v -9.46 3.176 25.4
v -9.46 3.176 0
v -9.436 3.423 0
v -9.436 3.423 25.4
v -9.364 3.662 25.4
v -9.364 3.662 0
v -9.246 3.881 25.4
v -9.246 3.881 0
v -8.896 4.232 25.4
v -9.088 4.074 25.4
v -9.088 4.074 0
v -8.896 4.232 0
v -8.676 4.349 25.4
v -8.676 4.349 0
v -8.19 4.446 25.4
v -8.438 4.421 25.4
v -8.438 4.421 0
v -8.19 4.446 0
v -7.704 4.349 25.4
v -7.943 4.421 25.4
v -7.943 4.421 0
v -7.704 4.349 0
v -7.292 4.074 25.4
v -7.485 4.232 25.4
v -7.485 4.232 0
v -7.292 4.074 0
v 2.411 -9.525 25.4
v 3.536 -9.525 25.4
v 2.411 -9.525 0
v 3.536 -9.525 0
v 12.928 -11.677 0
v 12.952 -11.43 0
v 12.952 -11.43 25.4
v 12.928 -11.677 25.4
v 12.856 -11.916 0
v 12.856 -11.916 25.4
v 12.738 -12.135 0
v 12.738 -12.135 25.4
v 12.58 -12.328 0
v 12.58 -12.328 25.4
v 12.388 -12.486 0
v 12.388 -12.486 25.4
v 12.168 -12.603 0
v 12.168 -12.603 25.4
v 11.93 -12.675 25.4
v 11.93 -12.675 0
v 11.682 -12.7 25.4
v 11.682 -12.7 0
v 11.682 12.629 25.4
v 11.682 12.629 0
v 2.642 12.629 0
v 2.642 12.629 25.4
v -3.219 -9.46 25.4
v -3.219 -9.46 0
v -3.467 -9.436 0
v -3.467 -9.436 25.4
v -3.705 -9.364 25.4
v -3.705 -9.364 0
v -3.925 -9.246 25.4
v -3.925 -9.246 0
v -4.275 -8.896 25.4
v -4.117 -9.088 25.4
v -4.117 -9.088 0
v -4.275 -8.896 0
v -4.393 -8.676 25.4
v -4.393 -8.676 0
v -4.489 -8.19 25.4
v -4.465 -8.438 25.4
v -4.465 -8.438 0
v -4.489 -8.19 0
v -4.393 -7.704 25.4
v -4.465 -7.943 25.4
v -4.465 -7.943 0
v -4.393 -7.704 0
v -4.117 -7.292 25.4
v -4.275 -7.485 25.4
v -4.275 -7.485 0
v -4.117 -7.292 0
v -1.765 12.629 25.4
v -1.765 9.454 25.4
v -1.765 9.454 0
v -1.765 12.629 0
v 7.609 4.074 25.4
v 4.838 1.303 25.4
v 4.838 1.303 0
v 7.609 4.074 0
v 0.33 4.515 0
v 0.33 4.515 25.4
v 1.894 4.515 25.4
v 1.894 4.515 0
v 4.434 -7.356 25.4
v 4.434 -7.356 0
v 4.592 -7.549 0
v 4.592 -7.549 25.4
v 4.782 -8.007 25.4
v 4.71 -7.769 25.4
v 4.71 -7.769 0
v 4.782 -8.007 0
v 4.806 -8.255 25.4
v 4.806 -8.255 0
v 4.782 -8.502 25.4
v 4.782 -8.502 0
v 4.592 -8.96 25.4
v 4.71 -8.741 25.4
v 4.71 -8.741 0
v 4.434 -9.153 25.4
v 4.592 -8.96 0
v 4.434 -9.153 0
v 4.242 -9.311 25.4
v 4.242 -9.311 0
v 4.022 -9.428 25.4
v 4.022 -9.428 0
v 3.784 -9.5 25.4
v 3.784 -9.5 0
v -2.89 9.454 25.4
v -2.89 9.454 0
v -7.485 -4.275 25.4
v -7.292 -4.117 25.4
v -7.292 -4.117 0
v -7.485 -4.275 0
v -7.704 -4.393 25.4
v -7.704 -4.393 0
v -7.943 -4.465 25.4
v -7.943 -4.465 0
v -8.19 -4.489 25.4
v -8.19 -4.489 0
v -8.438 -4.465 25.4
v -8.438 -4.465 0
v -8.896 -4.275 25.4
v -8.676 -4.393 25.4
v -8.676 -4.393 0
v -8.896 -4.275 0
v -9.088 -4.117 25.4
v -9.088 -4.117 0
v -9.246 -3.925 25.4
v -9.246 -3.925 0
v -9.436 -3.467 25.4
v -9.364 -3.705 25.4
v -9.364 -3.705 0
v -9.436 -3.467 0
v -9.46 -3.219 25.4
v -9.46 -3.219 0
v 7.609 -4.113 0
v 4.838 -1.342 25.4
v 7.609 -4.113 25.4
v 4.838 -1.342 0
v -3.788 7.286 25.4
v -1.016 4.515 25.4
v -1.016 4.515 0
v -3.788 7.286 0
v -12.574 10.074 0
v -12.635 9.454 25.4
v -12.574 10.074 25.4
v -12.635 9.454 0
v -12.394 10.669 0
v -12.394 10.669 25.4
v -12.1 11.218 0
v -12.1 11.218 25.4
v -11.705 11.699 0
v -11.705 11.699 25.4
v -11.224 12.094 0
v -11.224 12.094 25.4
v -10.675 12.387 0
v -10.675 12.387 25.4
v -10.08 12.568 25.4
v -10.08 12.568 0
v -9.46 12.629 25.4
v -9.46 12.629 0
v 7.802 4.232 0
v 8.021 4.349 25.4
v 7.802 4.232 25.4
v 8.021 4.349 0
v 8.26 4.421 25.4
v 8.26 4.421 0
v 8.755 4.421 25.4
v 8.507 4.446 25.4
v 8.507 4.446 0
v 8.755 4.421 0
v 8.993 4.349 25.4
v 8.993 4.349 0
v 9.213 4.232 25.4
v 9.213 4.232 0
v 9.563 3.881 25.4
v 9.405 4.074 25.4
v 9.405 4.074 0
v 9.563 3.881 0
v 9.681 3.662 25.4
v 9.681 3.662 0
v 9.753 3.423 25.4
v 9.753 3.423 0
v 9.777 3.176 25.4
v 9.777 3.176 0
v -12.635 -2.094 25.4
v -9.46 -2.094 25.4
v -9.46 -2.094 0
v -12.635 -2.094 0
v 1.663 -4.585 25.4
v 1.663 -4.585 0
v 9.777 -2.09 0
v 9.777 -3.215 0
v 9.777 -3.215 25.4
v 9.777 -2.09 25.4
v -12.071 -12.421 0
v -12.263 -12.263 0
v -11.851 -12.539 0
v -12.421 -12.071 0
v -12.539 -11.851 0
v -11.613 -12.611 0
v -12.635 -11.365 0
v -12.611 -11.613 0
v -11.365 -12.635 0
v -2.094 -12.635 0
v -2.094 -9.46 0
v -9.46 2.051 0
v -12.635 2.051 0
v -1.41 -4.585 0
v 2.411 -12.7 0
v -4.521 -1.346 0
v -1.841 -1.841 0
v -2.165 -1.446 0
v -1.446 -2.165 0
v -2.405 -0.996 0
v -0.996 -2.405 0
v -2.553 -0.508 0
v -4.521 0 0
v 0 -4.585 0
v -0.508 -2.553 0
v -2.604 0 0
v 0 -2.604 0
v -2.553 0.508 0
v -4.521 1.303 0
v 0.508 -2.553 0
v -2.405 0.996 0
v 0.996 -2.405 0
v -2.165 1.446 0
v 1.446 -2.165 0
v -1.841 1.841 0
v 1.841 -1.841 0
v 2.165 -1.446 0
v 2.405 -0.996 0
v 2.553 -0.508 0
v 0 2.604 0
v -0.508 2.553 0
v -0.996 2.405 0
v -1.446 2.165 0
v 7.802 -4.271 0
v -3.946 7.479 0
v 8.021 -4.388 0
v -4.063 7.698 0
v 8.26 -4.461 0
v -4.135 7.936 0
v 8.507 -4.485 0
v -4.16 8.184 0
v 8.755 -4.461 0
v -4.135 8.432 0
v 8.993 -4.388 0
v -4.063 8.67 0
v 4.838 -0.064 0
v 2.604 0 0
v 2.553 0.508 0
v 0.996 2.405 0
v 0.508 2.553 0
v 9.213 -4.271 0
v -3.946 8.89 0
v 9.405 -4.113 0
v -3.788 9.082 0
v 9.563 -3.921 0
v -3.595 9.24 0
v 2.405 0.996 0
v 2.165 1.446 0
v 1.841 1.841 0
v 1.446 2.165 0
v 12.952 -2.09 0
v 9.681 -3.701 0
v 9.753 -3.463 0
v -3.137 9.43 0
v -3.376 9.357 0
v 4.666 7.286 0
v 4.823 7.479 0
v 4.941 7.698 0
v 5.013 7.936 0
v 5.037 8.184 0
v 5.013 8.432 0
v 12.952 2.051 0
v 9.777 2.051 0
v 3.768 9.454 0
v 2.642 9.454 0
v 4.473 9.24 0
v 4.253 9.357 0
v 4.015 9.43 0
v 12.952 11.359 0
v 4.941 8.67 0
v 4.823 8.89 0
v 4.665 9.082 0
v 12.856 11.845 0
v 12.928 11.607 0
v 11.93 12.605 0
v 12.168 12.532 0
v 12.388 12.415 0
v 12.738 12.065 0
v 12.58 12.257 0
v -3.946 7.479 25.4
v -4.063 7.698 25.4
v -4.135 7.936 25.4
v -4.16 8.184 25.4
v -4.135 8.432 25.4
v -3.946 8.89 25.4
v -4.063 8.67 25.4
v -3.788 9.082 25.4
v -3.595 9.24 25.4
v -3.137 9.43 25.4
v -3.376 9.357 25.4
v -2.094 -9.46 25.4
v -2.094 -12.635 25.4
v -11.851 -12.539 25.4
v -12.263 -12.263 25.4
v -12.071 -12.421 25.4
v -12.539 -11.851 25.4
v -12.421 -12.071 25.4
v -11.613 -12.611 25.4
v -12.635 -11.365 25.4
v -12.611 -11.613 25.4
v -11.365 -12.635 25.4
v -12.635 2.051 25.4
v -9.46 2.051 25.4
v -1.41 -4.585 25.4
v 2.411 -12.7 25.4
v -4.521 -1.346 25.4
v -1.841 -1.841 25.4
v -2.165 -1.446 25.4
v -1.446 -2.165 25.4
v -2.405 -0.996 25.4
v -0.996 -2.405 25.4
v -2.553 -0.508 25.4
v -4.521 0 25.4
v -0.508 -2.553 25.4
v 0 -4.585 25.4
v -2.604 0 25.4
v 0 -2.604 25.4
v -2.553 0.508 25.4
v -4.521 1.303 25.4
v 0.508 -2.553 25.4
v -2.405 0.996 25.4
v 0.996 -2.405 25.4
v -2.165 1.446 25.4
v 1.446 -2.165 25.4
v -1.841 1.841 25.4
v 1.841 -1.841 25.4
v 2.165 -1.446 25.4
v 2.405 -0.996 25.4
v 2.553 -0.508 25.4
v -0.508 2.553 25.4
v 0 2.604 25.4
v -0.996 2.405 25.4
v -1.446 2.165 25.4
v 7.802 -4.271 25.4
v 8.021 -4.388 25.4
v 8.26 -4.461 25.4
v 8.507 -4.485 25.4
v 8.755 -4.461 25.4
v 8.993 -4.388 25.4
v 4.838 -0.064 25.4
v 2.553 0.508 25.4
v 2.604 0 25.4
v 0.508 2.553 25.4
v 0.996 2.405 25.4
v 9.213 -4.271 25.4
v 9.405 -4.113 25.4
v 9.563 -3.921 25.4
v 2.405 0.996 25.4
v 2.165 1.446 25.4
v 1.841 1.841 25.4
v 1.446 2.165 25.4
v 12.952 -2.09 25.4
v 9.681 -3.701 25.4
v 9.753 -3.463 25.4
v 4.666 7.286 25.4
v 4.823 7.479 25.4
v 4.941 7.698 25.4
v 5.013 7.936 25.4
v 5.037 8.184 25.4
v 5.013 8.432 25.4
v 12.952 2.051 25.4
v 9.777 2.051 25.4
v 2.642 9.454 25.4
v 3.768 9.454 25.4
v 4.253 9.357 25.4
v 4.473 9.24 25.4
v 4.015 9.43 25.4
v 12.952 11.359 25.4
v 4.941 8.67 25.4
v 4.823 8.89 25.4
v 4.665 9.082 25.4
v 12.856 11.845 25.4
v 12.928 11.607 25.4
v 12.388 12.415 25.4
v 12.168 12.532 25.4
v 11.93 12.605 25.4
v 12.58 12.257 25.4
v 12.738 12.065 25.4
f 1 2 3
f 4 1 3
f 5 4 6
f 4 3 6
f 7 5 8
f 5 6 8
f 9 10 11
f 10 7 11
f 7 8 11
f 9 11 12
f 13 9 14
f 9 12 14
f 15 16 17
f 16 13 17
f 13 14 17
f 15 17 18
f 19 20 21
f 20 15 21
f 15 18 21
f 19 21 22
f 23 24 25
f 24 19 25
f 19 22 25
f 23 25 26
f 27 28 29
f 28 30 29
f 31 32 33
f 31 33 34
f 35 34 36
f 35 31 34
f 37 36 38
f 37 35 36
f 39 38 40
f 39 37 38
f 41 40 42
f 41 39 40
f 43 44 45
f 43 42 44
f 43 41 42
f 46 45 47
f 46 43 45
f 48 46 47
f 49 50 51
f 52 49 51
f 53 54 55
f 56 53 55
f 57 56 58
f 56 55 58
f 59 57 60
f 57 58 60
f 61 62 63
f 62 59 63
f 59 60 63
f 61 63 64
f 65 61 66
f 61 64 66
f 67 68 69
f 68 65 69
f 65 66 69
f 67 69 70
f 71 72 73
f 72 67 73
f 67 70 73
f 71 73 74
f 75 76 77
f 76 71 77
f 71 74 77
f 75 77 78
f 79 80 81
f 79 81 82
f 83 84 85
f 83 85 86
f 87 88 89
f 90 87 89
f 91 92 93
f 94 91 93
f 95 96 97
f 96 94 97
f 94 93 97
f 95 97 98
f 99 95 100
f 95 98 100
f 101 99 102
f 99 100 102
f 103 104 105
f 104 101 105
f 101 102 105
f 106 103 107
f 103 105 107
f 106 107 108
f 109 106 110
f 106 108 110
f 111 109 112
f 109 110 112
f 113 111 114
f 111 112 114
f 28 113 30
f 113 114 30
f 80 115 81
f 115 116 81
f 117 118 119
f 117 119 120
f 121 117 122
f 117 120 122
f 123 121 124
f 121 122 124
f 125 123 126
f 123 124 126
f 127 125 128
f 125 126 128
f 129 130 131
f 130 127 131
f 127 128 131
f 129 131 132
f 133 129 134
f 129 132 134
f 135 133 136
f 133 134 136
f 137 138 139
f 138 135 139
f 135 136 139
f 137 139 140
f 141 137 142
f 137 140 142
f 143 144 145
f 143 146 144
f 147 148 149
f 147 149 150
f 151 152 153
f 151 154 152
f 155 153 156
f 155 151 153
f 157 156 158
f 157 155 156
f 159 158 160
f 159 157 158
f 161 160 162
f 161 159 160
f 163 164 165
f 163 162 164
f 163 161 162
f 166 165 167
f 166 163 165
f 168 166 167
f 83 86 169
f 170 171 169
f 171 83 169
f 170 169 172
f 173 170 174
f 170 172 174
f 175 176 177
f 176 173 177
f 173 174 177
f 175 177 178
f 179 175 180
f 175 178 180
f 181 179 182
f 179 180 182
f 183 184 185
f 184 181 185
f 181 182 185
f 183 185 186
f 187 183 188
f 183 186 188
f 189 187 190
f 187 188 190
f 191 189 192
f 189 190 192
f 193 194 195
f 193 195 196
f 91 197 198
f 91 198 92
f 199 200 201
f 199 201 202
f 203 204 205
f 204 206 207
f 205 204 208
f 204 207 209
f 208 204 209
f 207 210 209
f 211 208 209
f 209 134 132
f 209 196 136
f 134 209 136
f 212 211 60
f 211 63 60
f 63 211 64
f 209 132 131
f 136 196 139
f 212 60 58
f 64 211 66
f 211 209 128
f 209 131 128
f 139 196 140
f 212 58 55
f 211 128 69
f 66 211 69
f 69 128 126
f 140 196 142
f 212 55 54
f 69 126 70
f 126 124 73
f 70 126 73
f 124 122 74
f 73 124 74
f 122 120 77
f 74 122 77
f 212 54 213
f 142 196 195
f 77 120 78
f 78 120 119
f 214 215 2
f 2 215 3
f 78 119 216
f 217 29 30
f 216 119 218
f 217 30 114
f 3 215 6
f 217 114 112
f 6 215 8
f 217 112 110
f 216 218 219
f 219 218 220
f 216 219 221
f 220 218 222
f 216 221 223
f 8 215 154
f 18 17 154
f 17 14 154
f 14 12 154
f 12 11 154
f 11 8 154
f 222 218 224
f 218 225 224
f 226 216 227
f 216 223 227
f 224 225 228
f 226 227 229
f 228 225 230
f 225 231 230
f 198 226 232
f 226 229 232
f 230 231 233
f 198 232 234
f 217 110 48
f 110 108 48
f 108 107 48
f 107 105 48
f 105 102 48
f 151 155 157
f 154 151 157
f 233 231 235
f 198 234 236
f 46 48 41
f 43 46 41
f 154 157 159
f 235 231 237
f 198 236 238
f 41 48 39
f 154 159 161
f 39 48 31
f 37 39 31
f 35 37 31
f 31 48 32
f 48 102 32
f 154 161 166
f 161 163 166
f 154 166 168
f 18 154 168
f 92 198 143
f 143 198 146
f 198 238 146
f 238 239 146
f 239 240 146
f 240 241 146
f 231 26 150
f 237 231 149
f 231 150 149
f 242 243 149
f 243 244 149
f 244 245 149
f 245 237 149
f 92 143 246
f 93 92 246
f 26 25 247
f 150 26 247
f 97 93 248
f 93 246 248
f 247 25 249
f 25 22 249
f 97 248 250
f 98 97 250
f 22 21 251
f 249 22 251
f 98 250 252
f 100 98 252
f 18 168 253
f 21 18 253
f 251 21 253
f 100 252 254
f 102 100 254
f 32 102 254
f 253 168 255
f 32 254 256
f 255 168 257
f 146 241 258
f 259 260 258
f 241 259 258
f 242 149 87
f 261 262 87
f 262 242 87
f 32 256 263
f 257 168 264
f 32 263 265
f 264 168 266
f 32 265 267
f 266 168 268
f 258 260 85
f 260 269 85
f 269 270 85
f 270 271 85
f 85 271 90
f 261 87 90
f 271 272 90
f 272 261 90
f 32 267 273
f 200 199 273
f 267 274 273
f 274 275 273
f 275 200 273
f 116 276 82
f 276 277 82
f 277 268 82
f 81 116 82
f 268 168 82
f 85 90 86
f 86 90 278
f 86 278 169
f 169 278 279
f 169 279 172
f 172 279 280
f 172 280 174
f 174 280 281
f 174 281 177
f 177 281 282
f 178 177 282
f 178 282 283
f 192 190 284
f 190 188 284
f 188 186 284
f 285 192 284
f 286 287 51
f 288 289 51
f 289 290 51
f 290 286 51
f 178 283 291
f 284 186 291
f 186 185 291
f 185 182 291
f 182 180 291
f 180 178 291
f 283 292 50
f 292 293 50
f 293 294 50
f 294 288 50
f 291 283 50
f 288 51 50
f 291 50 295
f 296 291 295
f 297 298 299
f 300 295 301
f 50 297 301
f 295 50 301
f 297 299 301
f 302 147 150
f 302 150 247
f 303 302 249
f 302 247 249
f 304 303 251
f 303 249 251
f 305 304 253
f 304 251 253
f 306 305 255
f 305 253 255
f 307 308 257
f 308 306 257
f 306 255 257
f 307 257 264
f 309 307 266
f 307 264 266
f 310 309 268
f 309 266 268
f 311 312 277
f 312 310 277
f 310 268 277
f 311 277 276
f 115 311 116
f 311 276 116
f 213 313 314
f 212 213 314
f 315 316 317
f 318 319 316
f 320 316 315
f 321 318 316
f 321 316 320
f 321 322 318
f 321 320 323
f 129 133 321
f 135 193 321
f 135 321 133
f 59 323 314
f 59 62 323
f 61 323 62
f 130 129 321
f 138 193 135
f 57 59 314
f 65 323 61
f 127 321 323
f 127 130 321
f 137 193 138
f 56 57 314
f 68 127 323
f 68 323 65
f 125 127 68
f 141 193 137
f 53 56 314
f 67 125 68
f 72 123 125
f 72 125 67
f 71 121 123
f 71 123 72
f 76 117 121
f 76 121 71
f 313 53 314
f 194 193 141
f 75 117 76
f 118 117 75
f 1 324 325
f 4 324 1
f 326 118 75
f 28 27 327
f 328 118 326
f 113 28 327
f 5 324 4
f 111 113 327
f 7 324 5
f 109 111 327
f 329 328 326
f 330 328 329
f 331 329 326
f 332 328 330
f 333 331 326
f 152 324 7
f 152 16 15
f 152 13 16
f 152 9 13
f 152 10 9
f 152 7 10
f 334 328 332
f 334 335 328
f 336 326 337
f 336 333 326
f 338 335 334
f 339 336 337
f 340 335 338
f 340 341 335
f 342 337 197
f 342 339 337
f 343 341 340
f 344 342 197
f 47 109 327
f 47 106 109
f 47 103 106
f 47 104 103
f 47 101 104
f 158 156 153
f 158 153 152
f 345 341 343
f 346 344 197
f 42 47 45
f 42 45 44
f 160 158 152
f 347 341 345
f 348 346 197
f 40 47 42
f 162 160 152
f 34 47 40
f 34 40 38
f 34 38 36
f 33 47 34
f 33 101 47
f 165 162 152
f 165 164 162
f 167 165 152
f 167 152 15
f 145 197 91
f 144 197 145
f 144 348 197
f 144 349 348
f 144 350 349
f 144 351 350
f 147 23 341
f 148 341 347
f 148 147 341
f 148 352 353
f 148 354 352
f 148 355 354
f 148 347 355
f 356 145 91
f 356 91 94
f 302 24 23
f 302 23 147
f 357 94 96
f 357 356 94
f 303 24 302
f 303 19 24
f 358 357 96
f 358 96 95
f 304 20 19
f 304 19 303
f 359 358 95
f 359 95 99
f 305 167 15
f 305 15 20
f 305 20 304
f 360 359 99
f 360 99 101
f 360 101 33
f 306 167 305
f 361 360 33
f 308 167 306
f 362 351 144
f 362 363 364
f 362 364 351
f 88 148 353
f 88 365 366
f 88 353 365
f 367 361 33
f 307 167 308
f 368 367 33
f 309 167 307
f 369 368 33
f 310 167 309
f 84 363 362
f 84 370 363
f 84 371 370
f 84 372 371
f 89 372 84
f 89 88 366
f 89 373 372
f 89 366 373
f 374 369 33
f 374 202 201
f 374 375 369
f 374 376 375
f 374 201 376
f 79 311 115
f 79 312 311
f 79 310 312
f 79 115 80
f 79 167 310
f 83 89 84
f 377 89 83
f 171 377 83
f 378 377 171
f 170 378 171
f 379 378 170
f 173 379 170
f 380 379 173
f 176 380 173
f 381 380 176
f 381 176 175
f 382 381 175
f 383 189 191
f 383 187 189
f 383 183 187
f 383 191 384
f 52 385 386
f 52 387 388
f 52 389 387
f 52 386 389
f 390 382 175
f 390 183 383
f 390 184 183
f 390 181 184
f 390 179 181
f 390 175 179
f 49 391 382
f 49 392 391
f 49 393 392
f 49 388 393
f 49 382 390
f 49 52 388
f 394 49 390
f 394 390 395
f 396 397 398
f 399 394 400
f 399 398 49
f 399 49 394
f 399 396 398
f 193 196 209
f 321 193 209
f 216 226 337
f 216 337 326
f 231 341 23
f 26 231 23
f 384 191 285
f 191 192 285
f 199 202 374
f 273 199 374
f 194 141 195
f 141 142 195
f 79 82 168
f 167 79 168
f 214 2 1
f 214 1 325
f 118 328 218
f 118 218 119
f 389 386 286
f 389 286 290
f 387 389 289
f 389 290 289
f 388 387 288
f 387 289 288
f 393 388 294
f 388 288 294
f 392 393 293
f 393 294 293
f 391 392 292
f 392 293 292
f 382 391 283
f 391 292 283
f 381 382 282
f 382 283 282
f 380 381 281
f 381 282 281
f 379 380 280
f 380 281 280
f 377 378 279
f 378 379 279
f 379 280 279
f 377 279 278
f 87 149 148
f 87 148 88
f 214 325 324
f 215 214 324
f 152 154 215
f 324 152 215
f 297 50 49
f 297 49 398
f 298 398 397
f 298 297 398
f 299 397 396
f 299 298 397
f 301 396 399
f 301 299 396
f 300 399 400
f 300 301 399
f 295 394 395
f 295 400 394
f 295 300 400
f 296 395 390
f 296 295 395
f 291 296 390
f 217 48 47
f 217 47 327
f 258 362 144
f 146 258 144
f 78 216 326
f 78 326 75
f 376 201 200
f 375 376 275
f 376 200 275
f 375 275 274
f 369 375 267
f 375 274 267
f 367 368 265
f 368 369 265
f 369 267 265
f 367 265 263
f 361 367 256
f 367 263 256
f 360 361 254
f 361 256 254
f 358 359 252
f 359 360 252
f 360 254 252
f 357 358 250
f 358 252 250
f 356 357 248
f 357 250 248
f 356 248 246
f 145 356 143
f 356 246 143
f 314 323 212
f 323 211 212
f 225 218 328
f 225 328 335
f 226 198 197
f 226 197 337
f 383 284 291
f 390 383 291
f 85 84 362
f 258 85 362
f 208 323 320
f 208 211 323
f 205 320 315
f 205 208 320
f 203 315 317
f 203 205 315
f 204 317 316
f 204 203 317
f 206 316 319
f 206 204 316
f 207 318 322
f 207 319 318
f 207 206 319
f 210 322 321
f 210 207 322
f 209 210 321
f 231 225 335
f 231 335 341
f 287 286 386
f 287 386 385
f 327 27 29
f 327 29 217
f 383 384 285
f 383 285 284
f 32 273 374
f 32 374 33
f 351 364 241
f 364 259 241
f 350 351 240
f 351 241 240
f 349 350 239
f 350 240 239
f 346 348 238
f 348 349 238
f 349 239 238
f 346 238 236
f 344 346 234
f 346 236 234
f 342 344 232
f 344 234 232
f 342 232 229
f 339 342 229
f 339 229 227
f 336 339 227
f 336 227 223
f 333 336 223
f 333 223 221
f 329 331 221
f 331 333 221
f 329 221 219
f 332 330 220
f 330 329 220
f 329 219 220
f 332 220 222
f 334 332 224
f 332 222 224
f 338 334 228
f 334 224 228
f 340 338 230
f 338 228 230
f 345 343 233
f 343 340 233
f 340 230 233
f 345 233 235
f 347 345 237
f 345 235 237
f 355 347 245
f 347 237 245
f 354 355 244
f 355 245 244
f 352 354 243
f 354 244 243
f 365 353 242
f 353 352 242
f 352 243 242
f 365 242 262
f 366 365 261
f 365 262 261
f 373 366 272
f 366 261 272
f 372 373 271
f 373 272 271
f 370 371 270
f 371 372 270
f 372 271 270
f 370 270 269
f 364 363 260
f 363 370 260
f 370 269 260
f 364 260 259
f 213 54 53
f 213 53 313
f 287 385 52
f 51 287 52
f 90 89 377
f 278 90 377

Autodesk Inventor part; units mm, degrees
ref_plane "YZ Plane" through (0, 0, 0) normal (1, 0, 0) x (0, 1, 0)
ref_plane "XZ Plane" through (0, 0, 0) normal (0, 1, 0) x (-1, 0, 0)
ref_plane "XY Plane" through (0, 0, 0) normal (0, 0, 1) x (1, 0, 0)
sketch "Sketch1" plane through (0, 0, 0) normal (0, 0, 1) x (1, 0, 0)
  circle A0 centre (0, 0) radius 2.6035
  line L0 (0.3297, 4.515) -> (1.8944, 4.515)
  line L1 (4.8382, 1.3026) -> (4.8382, -0.0642)
  line L2 (4.8382, -0.0642) -> (4.8382, -1.3419)
  line L3 (4.8382, -0.0642) -> (6.1159, -0.0642) construction
  line L4 (1.6632, -4.5854) -> (0, -4.5854)
  line L5 (0, -4.5854) -> (-1.4104, -4.5854)
  line L6 (-4.5212, -1.3462) -> (-4.5212, 0)
  line L7 (-4.5212, 0) -> (-4.5212, 1.3026)
  line L8 (-1.0165, 4.515) -> (0.3297, 4.515)
  line L9 (1.8944, 4.515) -> (10.2327, 4.515) construction
  line L10 (1.8944, 4.515) -> (4.6655, 7.2861)
  line L11 (1.8944, 4.515) -> (5.8133, 4.515) construction
  line L12 (4.8382, 1.3026) -> (7.6093, 4.0737)
  line L13 (-1.0165, 4.515) -> (-3.7876, 7.2861)
  line L14 (-4.5212, 1.3026) -> (-7.2923, 4.0737)
  line L15 (-4.5212, -1.3462) -> (-7.2923, -4.1173)
  line L16 (-1.4104, -4.5854) -> (-4.1173, -7.2923)
  line L17 (1.6632, -4.5854) -> (4.4343, -7.3565)
  line L18 (4.8382, -1.3419) -> (7.6093, -4.113)
  line L19 (4.8382, -1.3419) -> (8.7572, -1.3419) construction
  line L20 (-2.8896, 9.4541) -> (-1.7646, 9.4541)
  line L21 (3.7675, 9.4541) -> (2.6425, 9.4541)
  line L22 (-9.4603, 3.1757) -> (-9.4603, 2.0507)
  line L23 (-9.4603, -3.2193) -> (-9.4603, -2.0943)
  line L24 (-3.2193, -9.4603) -> (-2.0943, -9.4603)
  line L25 (3.5363, -9.5246) -> (2.4114, -9.5246)
  line L26 (9.7774, -3.215) -> (9.7774, -2.0901)
  line L27 (9.7774, 3.1757) -> (9.7774, 2.0507)
  line L28 (-1.7646, 9.4541) -> (-1.7646, 12.6291)
  line L29 (-9.4603, 2.0507) -> (-12.6353, 2.0507)
  line L30 (-9.4603, -2.0943) -> (-12.6353, -2.0943)
  line L31 (-2.0943, -9.4603) -> (-2.0943, -12.6353)
  line L32 (2.4114, -9.5246) -> (2.4114, -12.6996)
  line L33 (9.7774, -2.0901) -> (12.9524, -2.0901)
  line L34 (9.7774, 2.0507) -> (12.9524, 2.0507)
  line L35 (2.6425, 9.4541) -> (2.6425, 12.6291)
  line L36 (-1.7646, 12.6291) -> (-9.4603, 12.6291)
  line L37 (-12.6353, 9.4541) -> (-12.6353, 2.0507)
  line L38 (-12.6353, -2.0943) -> (-12.6353, -11.3653)
  line L39 (-11.3653, -12.6353) -> (-2.0943, -12.6353)
  line L40 (12.9524, -2.0901) -> (12.9524, -11.4296)
  line L41 (11.6824, -12.6996) -> (2.4114, -12.6996)
  line L42 (12.9524, 2.0507) -> (12.9524, 11.3591)
  line L43 (11.6824, 12.6291) -> (2.6425, 12.6291)
  arc A1 (-9.4603, 12.6291) -> (-12.6353, 9.4541) centre (-9.4603, 9.4541) ccw
  arc A2 (-2.8896, 9.4541) -> (-3.7876, 7.2861) centre (-2.8896, 8.1841) ccw
  arc A3 (-7.2923, 4.0737) -> (-9.4603, 3.1757) centre (-8.1903, 3.1757) ccw
  arc A4 (-9.4603, -3.2193) -> (-7.2923, -4.1173) centre (-8.1903, -3.2193) ccw
  arc A5 (-4.1173, -7.2923) -> (-3.2193, -9.4603) centre (-3.2193, -8.1903) ccw
  arc A6 (3.5363, -9.5246) -> (4.4343, -7.3565) centre (3.5363, -8.2546) ccw
  arc A7 (7.6093, -4.113) -> (9.7774, -3.215) centre (8.5074, -3.215) ccw
  arc A8 (9.7774, 3.1757) -> (7.6093, 4.0737) centre (8.5074, 3.1757) ccw
  arc A9 (4.6655, 7.2861) -> (3.7675, 9.4541) centre (3.7675, 8.1841) ccw
  arc A10 (12.9524, 11.3591) -> (11.6824, 12.6291) centre (11.6824, 11.3591) ccw
  arc A11 (11.6824, -12.6996) -> (12.9524, -11.4296) centre (11.6824, -11.4296) ccw
  arc A12 (-12.6353, -11.3653) -> (-11.3653, -12.6353) centre (-11.3653, -11.3653) ccw
  point P0 (4.8382, 4.515)
  point P1 (4.8382, -4.5854)
  point P2 (-4.5212, -4.5854)
  point P3 (-4.5212, 4.515)
  point P4 (6.8335, 9.4541)
  point P5 (9.7774, 6.2417)
  point P6 (-5.9556, 9.4541)
  point P7 (-9.4603, 6.2417)
  point P8 (-9.4603, -6.2853)
  point P9 (-6.2853, -9.4603)
  point P10 (6.6024, -9.5246)
  point P11 (9.7774, -6.2811)
  dimension "d0" = 5.207
  dimension "d1" = 4.5085
  dimension "d2" = 90
  dimension "d3" = 4.5212
  dimension "d4" = 90
  dimension "d5" = 4.5212
  dimension "d9" = 6.985
  dimension "d10" = 45
  dimension "d11" = 6.985
  dimension "d12" = 6.985
  dimension "d13" = 6.985
  dimension "d14" = 6.985
  dimension "d15" = 6.985
  dimension "d16" = 6.985
  dimension "d17" = 45
  dimension "d18" = 4.191
  dimension "d19" = 4.191
  dimension "d20" = 4.191
  dimension "d21" = 4.191
  dimension "d22" = 4.191
  dimension "d23" = 4.191
  dimension "d24" = 4.191
  dimension "d25" = 4.191
  dimension "d26" = 3.175
  dimension "d27" = 3.175
  dimension "d28" = 3.175
  dimension "d29" = 3.175
  dimension "d30" = 3.175
  dimension "d31" = 1.27
  dimension "d32" = 1.27
extrude "Extrusion1" add sketch "Sketch1" along normal blind 25.4
properties part number "kylestslot"
